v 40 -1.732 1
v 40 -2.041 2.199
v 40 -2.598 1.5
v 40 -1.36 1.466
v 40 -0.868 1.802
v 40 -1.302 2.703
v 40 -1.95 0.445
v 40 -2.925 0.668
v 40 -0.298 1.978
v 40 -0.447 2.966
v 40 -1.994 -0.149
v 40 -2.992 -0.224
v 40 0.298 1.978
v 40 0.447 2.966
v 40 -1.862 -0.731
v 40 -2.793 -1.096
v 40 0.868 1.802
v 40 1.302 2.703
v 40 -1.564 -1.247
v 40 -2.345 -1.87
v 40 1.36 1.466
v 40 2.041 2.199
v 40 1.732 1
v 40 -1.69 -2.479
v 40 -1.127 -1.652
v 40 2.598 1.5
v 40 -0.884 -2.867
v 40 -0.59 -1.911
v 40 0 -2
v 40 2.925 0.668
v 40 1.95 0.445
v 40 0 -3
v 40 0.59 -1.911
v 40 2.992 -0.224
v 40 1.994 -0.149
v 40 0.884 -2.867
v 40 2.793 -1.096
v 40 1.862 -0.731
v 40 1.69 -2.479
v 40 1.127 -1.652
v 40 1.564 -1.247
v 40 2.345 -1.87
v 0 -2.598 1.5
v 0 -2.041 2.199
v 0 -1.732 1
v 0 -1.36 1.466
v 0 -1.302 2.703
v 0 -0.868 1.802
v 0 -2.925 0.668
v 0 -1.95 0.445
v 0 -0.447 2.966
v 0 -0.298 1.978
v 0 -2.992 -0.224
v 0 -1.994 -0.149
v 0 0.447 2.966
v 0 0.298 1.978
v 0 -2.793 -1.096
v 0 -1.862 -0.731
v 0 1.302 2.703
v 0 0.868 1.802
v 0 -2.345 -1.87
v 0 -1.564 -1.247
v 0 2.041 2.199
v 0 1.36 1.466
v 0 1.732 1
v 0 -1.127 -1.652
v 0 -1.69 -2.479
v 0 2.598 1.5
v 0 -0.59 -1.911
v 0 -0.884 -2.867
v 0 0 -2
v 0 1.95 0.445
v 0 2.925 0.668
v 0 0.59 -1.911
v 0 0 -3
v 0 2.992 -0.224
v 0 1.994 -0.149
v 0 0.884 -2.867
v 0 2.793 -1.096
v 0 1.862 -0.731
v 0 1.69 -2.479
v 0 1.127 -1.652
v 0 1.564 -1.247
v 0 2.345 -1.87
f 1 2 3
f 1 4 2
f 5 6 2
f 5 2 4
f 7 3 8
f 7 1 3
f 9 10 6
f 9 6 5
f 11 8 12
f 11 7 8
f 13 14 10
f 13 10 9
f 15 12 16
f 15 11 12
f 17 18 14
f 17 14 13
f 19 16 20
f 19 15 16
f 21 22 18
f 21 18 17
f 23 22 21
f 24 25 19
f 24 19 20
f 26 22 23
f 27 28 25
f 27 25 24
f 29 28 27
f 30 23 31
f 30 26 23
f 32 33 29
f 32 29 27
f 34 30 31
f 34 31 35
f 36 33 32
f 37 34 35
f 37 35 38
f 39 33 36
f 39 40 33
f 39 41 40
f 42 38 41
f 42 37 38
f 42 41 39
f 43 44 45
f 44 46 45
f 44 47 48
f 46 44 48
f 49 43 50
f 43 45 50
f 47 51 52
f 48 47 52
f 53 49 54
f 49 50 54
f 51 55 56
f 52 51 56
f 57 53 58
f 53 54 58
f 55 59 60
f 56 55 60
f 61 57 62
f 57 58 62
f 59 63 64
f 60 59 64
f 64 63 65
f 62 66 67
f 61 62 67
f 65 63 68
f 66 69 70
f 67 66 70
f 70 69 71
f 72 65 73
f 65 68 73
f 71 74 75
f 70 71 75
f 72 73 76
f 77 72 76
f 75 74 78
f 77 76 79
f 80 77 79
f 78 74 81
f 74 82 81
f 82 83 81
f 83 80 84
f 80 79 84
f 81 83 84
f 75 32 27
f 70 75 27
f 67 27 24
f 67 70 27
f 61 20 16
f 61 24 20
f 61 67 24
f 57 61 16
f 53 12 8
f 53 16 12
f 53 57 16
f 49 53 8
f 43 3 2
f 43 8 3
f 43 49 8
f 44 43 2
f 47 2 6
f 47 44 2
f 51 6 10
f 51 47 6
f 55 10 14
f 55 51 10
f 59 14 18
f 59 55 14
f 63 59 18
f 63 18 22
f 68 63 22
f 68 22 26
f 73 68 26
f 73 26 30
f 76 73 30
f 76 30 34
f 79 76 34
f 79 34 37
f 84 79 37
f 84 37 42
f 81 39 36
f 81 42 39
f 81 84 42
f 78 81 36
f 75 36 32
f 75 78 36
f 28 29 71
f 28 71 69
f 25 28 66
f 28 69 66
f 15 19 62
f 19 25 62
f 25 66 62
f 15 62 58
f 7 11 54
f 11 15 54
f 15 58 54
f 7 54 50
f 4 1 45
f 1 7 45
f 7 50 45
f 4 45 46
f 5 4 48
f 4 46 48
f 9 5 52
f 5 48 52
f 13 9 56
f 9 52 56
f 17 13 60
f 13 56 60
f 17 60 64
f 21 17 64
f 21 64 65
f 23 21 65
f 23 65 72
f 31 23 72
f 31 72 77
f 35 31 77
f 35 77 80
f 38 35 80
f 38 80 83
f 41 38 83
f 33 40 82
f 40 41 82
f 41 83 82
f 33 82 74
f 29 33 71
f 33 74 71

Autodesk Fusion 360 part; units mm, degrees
sketch "Skizze1" plane through (0, 0, 0) normal (1, 0, 0) x (0, 0, -1)
  circle A0 centre (0, 0) radius 3
  circle A1 centre (0, 0) radius 2
  dimension "d1" = 6
  dimension "d2" = 4
extrude "Extrusion1" add sketch "Skizze1" along normal blind 40 makes body 1
copy_body "Körper->Berechn1" bodies 1 removing the originals makes body 2 in component "SwagelokTube"
component "SwagelokTube" placed x (1, 0, 0) y (0, 1, 0) z (0, 0, 1) at (0, 0, 0)
